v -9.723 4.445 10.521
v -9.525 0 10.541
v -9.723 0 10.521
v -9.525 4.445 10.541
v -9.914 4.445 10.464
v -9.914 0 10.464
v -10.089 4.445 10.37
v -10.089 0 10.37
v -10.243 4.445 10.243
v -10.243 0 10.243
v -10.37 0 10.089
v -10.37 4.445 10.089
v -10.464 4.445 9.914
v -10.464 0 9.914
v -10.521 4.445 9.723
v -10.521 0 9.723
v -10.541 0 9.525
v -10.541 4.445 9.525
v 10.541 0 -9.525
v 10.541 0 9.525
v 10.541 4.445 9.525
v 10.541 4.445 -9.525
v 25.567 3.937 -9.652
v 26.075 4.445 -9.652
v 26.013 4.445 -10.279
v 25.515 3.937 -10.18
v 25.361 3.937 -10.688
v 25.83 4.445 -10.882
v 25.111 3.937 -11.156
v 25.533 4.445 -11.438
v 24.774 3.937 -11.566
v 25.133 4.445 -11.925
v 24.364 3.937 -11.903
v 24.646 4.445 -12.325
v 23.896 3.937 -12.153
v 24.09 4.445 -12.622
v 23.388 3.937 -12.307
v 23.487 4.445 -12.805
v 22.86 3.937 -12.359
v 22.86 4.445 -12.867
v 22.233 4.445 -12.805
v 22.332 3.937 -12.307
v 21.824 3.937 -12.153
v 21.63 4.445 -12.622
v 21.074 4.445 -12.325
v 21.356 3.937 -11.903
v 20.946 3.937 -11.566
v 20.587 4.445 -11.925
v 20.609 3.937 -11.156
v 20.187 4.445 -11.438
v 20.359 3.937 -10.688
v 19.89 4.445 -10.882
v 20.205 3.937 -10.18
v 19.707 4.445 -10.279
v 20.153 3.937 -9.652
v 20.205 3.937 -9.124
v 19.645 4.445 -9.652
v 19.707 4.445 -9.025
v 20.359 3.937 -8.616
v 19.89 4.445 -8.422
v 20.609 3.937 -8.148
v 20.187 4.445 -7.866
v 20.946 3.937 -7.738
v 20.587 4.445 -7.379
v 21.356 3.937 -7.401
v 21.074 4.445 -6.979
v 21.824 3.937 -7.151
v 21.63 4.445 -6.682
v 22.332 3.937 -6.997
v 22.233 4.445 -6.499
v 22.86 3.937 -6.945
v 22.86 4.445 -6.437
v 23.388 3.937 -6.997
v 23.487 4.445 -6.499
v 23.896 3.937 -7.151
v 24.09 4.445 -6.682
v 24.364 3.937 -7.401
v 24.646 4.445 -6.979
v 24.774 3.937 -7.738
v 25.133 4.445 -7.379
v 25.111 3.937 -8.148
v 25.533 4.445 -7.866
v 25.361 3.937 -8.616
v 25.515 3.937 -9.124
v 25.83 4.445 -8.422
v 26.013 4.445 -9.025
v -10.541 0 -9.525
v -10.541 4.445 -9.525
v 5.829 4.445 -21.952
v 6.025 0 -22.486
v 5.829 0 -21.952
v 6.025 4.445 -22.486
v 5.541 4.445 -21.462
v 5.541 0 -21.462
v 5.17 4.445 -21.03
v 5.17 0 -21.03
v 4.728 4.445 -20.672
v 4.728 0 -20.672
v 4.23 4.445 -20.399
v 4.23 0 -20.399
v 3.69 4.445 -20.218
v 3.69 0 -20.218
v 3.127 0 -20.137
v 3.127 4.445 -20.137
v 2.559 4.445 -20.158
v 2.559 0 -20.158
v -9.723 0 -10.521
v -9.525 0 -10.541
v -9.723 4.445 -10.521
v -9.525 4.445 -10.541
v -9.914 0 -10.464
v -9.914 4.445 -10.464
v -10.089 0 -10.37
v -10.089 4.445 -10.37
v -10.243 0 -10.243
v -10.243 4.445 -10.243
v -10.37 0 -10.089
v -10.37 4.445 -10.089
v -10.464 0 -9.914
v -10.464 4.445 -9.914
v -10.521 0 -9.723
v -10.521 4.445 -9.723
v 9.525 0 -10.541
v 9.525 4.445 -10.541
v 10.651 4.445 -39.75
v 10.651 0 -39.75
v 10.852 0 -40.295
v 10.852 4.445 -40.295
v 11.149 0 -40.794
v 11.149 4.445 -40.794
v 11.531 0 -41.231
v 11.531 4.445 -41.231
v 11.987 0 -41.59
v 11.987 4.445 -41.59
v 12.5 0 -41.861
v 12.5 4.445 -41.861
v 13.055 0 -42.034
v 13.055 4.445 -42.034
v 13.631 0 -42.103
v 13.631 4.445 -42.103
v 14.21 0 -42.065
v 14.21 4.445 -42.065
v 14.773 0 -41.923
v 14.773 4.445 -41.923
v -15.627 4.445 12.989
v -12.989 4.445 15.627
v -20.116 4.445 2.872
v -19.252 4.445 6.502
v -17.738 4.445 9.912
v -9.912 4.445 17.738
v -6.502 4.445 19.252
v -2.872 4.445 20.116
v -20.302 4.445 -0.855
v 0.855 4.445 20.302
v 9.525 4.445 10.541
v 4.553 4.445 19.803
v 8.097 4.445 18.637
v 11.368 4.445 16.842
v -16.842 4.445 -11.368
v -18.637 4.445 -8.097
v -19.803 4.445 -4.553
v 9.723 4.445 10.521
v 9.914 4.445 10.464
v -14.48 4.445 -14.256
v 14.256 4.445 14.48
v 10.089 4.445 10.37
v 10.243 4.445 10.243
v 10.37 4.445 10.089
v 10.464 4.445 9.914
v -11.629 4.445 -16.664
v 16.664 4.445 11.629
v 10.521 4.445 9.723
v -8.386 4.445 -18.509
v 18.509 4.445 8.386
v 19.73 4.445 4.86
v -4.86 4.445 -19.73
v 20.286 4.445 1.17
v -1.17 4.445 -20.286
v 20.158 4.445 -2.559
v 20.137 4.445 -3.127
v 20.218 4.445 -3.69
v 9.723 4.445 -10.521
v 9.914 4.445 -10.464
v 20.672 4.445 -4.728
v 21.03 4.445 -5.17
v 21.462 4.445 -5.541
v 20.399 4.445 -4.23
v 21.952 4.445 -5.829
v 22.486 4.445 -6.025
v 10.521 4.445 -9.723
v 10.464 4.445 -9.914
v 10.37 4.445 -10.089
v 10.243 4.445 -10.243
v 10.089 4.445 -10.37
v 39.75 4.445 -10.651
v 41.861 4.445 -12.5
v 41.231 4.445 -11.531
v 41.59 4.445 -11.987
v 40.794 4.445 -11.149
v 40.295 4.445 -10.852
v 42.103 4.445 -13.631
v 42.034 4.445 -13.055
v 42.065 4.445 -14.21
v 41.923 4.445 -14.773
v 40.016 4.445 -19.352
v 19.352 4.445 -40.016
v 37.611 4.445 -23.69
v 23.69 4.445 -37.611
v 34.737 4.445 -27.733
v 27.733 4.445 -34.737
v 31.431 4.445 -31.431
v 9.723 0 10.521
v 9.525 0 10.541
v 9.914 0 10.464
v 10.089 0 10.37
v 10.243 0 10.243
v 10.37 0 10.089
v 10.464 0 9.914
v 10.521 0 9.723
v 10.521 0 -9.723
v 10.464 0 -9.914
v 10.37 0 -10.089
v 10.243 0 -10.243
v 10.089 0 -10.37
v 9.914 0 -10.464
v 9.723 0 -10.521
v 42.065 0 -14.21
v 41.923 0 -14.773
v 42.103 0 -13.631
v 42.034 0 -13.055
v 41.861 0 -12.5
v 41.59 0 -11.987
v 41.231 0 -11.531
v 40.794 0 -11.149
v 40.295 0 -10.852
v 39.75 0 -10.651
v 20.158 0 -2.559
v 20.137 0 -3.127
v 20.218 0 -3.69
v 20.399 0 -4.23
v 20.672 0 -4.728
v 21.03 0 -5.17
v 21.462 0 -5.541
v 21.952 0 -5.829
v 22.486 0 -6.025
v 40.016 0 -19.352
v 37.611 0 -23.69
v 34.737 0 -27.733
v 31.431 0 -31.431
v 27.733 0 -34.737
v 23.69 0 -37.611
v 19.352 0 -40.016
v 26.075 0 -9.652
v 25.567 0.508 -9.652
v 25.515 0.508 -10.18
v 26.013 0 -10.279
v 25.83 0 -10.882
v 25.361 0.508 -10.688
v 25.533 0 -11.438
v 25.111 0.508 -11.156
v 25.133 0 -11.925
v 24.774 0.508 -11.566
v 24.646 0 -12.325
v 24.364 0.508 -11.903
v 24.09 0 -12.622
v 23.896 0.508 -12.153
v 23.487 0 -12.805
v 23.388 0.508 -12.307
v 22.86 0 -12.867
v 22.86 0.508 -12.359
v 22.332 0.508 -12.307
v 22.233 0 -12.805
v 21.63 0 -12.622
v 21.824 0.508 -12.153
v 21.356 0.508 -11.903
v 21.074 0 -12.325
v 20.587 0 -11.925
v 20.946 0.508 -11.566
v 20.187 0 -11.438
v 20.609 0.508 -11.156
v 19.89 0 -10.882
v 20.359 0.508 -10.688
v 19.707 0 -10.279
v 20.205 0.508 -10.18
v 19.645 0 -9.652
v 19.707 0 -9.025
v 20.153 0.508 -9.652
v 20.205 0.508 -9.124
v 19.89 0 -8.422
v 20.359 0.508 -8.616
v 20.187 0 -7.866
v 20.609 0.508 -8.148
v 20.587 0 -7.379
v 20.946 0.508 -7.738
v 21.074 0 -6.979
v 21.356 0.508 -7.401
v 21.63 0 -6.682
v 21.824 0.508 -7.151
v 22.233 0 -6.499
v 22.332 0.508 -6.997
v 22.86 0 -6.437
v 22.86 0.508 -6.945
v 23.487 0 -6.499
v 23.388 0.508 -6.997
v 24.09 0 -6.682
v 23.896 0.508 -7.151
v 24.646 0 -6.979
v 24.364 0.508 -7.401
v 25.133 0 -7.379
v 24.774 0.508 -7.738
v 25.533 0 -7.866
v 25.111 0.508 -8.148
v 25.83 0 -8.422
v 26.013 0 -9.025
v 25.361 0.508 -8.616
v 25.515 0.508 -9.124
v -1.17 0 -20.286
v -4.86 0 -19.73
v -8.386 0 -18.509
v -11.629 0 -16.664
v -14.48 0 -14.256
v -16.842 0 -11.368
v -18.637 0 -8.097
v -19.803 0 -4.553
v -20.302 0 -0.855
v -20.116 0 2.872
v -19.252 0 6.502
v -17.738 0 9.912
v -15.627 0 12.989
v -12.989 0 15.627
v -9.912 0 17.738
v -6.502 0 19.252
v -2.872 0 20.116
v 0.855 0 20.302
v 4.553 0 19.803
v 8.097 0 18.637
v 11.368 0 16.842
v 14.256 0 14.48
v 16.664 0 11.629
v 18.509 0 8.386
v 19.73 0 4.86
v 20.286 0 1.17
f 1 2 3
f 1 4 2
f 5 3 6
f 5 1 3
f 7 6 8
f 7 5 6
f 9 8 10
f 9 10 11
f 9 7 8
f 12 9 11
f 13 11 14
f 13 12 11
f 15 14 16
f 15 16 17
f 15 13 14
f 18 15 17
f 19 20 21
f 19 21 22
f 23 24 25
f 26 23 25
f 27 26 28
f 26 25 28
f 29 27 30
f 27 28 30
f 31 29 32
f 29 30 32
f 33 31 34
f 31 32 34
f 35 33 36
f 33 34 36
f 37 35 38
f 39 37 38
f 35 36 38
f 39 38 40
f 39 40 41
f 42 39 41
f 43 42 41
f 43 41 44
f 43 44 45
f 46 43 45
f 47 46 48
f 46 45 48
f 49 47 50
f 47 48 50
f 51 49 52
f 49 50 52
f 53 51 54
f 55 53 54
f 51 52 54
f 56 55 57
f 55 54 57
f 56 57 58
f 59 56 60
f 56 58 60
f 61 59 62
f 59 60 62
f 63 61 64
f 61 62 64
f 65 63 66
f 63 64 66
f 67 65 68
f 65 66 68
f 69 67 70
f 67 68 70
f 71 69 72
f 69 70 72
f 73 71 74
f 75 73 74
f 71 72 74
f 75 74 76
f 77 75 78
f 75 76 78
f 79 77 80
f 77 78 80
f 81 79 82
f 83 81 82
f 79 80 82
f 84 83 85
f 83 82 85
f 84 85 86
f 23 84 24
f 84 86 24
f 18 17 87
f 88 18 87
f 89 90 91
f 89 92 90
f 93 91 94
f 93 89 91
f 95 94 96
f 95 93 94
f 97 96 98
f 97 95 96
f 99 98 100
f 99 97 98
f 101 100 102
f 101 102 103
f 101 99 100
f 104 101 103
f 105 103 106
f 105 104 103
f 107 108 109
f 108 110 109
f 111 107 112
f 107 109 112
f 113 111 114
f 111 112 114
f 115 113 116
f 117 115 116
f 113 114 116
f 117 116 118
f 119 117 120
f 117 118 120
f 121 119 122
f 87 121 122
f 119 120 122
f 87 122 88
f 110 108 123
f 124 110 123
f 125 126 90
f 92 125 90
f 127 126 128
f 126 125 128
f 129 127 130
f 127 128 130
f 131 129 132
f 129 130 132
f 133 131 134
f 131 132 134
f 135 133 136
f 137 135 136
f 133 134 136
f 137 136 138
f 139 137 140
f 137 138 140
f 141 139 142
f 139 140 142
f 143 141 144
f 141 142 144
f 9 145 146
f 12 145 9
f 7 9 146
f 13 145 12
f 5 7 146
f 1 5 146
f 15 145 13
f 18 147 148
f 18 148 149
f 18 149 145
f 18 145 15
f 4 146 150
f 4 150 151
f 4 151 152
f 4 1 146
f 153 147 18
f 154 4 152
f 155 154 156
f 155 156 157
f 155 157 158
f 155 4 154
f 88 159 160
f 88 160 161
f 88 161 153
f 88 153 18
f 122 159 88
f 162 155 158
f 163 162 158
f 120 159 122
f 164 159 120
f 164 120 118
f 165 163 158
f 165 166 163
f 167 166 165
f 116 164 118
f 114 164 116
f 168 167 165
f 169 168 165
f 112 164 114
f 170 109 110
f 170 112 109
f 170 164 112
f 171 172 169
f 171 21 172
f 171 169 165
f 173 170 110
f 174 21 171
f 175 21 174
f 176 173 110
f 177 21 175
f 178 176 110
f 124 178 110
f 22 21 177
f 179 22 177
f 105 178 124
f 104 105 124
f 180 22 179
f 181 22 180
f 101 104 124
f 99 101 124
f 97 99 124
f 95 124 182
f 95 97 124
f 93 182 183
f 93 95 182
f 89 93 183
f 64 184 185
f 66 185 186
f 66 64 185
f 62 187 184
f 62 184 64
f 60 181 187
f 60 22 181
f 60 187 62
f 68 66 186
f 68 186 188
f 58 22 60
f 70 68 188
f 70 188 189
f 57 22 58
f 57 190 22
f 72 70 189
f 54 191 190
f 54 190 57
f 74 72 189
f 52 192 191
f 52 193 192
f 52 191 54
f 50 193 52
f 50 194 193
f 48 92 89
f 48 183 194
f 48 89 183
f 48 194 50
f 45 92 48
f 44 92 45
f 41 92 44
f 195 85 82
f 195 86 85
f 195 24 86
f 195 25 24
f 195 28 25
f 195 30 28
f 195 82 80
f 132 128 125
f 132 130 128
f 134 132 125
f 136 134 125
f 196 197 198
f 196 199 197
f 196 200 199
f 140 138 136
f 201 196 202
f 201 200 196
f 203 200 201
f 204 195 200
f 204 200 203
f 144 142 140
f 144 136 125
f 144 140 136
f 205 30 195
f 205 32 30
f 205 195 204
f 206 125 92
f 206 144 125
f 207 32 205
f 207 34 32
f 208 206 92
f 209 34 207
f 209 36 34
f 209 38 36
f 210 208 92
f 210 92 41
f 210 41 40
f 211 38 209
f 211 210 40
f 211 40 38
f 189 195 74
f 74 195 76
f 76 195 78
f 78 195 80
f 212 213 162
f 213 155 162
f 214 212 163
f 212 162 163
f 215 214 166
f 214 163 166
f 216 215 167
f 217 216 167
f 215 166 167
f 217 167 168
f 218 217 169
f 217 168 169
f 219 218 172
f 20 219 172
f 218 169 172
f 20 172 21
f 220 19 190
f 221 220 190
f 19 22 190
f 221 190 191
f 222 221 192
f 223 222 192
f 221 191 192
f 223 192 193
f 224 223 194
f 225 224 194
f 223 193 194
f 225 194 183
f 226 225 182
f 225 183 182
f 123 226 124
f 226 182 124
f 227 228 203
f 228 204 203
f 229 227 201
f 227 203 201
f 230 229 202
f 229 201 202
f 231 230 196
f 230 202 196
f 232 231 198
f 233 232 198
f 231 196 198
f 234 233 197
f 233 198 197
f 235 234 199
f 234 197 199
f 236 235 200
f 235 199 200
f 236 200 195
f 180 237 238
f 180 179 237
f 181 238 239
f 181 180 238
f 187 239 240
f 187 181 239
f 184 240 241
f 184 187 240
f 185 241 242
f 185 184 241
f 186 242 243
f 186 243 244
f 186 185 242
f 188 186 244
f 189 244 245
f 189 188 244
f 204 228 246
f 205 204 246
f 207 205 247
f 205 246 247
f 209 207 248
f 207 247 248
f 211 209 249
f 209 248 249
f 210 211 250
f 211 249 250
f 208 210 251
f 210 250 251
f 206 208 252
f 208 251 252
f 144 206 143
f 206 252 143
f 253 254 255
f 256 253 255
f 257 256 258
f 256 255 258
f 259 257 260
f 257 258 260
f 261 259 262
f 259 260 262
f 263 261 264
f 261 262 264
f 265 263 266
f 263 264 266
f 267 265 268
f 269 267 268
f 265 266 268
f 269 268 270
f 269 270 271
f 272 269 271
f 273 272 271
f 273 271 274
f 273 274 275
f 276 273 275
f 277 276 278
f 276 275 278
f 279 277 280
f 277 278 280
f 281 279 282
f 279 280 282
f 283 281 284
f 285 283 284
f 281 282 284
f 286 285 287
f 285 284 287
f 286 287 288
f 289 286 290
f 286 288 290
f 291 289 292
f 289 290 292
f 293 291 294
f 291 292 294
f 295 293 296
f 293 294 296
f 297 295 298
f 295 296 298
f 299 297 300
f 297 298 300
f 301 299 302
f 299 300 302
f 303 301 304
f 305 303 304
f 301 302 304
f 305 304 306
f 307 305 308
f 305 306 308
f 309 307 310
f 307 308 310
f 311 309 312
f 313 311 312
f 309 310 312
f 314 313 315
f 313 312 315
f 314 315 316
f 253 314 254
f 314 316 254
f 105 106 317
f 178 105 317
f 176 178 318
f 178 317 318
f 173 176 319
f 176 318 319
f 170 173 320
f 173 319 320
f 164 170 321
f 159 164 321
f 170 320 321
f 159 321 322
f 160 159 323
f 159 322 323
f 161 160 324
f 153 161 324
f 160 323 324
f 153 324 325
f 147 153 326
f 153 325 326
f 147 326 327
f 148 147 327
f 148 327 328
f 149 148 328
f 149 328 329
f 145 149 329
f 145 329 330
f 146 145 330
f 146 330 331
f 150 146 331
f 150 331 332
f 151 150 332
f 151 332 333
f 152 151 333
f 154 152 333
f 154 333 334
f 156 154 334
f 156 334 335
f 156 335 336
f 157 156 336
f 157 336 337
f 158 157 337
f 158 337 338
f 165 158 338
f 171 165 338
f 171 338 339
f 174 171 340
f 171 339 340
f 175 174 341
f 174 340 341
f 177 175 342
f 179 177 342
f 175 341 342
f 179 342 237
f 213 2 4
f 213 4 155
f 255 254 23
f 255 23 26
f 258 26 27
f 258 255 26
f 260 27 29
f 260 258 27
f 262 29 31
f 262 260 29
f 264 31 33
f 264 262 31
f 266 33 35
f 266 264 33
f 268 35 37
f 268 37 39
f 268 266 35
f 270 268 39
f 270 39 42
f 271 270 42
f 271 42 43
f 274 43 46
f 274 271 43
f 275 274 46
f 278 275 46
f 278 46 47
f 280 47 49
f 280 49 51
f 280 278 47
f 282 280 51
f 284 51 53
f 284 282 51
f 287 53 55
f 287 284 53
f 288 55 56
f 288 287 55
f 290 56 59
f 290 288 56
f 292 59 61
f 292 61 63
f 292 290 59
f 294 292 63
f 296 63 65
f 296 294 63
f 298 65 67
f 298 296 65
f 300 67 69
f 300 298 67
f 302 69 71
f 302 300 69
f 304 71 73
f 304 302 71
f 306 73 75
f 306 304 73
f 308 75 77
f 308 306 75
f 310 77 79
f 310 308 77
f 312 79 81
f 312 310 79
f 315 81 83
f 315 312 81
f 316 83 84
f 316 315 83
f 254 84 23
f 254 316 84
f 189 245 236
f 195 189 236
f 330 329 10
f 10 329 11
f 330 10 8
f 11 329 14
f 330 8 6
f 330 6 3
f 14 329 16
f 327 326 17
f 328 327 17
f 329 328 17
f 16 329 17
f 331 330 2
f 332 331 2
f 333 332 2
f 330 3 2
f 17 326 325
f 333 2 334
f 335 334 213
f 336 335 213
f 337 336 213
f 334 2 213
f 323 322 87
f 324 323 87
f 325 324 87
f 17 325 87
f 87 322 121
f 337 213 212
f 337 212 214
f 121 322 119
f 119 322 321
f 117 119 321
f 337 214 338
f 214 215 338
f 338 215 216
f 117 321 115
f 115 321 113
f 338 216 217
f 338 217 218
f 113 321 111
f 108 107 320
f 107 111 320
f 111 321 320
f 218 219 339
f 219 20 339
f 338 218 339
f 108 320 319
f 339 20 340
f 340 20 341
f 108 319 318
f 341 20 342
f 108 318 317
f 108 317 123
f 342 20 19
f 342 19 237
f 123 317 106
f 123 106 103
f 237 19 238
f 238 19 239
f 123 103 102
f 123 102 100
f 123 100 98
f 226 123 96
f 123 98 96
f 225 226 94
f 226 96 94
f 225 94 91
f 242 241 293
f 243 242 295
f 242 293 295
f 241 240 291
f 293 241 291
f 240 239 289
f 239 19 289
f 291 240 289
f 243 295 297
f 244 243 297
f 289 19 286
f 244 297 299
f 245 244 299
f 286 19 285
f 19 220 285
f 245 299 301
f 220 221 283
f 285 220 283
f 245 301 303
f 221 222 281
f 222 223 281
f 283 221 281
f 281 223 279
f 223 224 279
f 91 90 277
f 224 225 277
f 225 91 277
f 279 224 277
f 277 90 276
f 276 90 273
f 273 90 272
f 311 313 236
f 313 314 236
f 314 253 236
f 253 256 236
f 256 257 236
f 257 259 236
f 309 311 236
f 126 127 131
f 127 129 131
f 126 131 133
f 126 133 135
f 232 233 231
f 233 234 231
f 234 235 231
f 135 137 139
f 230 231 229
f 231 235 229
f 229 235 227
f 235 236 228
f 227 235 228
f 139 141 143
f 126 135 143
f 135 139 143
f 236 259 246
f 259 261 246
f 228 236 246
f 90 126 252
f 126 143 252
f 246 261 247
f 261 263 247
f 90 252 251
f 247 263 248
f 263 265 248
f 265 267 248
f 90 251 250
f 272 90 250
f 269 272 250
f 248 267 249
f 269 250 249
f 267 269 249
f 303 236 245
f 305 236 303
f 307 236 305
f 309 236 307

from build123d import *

# Parameters (mm, degrees)
SKETCH2_R           = 2.706768225
SKETCH2_W           = 21.082
SKETCH2_H           = 21.082
BOSS_EXTRUDE1_DEPTH = 4.445
FILLET1_R           = 3.175
FILLET2_R           = 1.016
CHAMFER1_SIZE       = 0.508


with BuildPart() as part:
    # Sketch2 → Boss-Extrude1 (new body)
    with BuildSketch(Plane(origin=(0, 0, 0), x_dir=(1, 0, 0), z_dir=(0, 1, 0))):
        with BuildLine():
            Line((11.504506555, 42.935402979), (5.259202996, 19.62761279))
            ThreePointArc((5.259202996, 19.62761279), (-14.368409794, -14.368409794), (19.62761279, 5.259202996))
            Line((19.62761279, 5.259202996), (42.935402979, 11.504506555))
            ThreePointArc((42.935402979, 11.504506555), (31.430896424, 31.430896424), (11.504506555, 42.935402979))
        make_face()
        with Locations((22.86, 9.652)):
            Circle(SKETCH2_R, mode=Mode.SUBTRACT)
        Rectangle(SKETCH2_W, SKETCH2_H, mode=Mode.SUBTRACT)
    extrude(amount=BOSS_EXTRUDE1_DEPTH)

    # Fillet1
    fillet1_edges = [part.edges().sort_by_distance(p)[0] for p in [
        (42.935402979, 2.2225, -11.504506555),
        (19.62761279, 2.2225, -5.259202996),
        (5.259202996, 2.2225, -19.62761279),
        (11.504506555, 2.2225, -42.935402979),
    ]]
    fillet(fillet1_edges, radius=FILLET1_R)

    # Fillet2
    fillet2_edges = [part.edges().sort_by_distance(p)[0] for p in [
        (10.541, 2.2225, 10.541),
        (10.541, 2.2225, -10.541),
        (-10.541, 2.2225, -10.541),
        (-10.541, 2.2225, 10.541),
    ]]
    fillet(fillet2_edges, radius=FILLET2_R)

    # Chamfer1
    chamfer1_edges = [part.edges().sort_by_distance(p)[0] for p in [
        (20.153231775, 0, -9.652),
        (20.153231775, 4.445, -9.652),
    ]]
    chamfer(chamfer1_edges, length=CHAMFER1_SIZE)


solid = part.part
